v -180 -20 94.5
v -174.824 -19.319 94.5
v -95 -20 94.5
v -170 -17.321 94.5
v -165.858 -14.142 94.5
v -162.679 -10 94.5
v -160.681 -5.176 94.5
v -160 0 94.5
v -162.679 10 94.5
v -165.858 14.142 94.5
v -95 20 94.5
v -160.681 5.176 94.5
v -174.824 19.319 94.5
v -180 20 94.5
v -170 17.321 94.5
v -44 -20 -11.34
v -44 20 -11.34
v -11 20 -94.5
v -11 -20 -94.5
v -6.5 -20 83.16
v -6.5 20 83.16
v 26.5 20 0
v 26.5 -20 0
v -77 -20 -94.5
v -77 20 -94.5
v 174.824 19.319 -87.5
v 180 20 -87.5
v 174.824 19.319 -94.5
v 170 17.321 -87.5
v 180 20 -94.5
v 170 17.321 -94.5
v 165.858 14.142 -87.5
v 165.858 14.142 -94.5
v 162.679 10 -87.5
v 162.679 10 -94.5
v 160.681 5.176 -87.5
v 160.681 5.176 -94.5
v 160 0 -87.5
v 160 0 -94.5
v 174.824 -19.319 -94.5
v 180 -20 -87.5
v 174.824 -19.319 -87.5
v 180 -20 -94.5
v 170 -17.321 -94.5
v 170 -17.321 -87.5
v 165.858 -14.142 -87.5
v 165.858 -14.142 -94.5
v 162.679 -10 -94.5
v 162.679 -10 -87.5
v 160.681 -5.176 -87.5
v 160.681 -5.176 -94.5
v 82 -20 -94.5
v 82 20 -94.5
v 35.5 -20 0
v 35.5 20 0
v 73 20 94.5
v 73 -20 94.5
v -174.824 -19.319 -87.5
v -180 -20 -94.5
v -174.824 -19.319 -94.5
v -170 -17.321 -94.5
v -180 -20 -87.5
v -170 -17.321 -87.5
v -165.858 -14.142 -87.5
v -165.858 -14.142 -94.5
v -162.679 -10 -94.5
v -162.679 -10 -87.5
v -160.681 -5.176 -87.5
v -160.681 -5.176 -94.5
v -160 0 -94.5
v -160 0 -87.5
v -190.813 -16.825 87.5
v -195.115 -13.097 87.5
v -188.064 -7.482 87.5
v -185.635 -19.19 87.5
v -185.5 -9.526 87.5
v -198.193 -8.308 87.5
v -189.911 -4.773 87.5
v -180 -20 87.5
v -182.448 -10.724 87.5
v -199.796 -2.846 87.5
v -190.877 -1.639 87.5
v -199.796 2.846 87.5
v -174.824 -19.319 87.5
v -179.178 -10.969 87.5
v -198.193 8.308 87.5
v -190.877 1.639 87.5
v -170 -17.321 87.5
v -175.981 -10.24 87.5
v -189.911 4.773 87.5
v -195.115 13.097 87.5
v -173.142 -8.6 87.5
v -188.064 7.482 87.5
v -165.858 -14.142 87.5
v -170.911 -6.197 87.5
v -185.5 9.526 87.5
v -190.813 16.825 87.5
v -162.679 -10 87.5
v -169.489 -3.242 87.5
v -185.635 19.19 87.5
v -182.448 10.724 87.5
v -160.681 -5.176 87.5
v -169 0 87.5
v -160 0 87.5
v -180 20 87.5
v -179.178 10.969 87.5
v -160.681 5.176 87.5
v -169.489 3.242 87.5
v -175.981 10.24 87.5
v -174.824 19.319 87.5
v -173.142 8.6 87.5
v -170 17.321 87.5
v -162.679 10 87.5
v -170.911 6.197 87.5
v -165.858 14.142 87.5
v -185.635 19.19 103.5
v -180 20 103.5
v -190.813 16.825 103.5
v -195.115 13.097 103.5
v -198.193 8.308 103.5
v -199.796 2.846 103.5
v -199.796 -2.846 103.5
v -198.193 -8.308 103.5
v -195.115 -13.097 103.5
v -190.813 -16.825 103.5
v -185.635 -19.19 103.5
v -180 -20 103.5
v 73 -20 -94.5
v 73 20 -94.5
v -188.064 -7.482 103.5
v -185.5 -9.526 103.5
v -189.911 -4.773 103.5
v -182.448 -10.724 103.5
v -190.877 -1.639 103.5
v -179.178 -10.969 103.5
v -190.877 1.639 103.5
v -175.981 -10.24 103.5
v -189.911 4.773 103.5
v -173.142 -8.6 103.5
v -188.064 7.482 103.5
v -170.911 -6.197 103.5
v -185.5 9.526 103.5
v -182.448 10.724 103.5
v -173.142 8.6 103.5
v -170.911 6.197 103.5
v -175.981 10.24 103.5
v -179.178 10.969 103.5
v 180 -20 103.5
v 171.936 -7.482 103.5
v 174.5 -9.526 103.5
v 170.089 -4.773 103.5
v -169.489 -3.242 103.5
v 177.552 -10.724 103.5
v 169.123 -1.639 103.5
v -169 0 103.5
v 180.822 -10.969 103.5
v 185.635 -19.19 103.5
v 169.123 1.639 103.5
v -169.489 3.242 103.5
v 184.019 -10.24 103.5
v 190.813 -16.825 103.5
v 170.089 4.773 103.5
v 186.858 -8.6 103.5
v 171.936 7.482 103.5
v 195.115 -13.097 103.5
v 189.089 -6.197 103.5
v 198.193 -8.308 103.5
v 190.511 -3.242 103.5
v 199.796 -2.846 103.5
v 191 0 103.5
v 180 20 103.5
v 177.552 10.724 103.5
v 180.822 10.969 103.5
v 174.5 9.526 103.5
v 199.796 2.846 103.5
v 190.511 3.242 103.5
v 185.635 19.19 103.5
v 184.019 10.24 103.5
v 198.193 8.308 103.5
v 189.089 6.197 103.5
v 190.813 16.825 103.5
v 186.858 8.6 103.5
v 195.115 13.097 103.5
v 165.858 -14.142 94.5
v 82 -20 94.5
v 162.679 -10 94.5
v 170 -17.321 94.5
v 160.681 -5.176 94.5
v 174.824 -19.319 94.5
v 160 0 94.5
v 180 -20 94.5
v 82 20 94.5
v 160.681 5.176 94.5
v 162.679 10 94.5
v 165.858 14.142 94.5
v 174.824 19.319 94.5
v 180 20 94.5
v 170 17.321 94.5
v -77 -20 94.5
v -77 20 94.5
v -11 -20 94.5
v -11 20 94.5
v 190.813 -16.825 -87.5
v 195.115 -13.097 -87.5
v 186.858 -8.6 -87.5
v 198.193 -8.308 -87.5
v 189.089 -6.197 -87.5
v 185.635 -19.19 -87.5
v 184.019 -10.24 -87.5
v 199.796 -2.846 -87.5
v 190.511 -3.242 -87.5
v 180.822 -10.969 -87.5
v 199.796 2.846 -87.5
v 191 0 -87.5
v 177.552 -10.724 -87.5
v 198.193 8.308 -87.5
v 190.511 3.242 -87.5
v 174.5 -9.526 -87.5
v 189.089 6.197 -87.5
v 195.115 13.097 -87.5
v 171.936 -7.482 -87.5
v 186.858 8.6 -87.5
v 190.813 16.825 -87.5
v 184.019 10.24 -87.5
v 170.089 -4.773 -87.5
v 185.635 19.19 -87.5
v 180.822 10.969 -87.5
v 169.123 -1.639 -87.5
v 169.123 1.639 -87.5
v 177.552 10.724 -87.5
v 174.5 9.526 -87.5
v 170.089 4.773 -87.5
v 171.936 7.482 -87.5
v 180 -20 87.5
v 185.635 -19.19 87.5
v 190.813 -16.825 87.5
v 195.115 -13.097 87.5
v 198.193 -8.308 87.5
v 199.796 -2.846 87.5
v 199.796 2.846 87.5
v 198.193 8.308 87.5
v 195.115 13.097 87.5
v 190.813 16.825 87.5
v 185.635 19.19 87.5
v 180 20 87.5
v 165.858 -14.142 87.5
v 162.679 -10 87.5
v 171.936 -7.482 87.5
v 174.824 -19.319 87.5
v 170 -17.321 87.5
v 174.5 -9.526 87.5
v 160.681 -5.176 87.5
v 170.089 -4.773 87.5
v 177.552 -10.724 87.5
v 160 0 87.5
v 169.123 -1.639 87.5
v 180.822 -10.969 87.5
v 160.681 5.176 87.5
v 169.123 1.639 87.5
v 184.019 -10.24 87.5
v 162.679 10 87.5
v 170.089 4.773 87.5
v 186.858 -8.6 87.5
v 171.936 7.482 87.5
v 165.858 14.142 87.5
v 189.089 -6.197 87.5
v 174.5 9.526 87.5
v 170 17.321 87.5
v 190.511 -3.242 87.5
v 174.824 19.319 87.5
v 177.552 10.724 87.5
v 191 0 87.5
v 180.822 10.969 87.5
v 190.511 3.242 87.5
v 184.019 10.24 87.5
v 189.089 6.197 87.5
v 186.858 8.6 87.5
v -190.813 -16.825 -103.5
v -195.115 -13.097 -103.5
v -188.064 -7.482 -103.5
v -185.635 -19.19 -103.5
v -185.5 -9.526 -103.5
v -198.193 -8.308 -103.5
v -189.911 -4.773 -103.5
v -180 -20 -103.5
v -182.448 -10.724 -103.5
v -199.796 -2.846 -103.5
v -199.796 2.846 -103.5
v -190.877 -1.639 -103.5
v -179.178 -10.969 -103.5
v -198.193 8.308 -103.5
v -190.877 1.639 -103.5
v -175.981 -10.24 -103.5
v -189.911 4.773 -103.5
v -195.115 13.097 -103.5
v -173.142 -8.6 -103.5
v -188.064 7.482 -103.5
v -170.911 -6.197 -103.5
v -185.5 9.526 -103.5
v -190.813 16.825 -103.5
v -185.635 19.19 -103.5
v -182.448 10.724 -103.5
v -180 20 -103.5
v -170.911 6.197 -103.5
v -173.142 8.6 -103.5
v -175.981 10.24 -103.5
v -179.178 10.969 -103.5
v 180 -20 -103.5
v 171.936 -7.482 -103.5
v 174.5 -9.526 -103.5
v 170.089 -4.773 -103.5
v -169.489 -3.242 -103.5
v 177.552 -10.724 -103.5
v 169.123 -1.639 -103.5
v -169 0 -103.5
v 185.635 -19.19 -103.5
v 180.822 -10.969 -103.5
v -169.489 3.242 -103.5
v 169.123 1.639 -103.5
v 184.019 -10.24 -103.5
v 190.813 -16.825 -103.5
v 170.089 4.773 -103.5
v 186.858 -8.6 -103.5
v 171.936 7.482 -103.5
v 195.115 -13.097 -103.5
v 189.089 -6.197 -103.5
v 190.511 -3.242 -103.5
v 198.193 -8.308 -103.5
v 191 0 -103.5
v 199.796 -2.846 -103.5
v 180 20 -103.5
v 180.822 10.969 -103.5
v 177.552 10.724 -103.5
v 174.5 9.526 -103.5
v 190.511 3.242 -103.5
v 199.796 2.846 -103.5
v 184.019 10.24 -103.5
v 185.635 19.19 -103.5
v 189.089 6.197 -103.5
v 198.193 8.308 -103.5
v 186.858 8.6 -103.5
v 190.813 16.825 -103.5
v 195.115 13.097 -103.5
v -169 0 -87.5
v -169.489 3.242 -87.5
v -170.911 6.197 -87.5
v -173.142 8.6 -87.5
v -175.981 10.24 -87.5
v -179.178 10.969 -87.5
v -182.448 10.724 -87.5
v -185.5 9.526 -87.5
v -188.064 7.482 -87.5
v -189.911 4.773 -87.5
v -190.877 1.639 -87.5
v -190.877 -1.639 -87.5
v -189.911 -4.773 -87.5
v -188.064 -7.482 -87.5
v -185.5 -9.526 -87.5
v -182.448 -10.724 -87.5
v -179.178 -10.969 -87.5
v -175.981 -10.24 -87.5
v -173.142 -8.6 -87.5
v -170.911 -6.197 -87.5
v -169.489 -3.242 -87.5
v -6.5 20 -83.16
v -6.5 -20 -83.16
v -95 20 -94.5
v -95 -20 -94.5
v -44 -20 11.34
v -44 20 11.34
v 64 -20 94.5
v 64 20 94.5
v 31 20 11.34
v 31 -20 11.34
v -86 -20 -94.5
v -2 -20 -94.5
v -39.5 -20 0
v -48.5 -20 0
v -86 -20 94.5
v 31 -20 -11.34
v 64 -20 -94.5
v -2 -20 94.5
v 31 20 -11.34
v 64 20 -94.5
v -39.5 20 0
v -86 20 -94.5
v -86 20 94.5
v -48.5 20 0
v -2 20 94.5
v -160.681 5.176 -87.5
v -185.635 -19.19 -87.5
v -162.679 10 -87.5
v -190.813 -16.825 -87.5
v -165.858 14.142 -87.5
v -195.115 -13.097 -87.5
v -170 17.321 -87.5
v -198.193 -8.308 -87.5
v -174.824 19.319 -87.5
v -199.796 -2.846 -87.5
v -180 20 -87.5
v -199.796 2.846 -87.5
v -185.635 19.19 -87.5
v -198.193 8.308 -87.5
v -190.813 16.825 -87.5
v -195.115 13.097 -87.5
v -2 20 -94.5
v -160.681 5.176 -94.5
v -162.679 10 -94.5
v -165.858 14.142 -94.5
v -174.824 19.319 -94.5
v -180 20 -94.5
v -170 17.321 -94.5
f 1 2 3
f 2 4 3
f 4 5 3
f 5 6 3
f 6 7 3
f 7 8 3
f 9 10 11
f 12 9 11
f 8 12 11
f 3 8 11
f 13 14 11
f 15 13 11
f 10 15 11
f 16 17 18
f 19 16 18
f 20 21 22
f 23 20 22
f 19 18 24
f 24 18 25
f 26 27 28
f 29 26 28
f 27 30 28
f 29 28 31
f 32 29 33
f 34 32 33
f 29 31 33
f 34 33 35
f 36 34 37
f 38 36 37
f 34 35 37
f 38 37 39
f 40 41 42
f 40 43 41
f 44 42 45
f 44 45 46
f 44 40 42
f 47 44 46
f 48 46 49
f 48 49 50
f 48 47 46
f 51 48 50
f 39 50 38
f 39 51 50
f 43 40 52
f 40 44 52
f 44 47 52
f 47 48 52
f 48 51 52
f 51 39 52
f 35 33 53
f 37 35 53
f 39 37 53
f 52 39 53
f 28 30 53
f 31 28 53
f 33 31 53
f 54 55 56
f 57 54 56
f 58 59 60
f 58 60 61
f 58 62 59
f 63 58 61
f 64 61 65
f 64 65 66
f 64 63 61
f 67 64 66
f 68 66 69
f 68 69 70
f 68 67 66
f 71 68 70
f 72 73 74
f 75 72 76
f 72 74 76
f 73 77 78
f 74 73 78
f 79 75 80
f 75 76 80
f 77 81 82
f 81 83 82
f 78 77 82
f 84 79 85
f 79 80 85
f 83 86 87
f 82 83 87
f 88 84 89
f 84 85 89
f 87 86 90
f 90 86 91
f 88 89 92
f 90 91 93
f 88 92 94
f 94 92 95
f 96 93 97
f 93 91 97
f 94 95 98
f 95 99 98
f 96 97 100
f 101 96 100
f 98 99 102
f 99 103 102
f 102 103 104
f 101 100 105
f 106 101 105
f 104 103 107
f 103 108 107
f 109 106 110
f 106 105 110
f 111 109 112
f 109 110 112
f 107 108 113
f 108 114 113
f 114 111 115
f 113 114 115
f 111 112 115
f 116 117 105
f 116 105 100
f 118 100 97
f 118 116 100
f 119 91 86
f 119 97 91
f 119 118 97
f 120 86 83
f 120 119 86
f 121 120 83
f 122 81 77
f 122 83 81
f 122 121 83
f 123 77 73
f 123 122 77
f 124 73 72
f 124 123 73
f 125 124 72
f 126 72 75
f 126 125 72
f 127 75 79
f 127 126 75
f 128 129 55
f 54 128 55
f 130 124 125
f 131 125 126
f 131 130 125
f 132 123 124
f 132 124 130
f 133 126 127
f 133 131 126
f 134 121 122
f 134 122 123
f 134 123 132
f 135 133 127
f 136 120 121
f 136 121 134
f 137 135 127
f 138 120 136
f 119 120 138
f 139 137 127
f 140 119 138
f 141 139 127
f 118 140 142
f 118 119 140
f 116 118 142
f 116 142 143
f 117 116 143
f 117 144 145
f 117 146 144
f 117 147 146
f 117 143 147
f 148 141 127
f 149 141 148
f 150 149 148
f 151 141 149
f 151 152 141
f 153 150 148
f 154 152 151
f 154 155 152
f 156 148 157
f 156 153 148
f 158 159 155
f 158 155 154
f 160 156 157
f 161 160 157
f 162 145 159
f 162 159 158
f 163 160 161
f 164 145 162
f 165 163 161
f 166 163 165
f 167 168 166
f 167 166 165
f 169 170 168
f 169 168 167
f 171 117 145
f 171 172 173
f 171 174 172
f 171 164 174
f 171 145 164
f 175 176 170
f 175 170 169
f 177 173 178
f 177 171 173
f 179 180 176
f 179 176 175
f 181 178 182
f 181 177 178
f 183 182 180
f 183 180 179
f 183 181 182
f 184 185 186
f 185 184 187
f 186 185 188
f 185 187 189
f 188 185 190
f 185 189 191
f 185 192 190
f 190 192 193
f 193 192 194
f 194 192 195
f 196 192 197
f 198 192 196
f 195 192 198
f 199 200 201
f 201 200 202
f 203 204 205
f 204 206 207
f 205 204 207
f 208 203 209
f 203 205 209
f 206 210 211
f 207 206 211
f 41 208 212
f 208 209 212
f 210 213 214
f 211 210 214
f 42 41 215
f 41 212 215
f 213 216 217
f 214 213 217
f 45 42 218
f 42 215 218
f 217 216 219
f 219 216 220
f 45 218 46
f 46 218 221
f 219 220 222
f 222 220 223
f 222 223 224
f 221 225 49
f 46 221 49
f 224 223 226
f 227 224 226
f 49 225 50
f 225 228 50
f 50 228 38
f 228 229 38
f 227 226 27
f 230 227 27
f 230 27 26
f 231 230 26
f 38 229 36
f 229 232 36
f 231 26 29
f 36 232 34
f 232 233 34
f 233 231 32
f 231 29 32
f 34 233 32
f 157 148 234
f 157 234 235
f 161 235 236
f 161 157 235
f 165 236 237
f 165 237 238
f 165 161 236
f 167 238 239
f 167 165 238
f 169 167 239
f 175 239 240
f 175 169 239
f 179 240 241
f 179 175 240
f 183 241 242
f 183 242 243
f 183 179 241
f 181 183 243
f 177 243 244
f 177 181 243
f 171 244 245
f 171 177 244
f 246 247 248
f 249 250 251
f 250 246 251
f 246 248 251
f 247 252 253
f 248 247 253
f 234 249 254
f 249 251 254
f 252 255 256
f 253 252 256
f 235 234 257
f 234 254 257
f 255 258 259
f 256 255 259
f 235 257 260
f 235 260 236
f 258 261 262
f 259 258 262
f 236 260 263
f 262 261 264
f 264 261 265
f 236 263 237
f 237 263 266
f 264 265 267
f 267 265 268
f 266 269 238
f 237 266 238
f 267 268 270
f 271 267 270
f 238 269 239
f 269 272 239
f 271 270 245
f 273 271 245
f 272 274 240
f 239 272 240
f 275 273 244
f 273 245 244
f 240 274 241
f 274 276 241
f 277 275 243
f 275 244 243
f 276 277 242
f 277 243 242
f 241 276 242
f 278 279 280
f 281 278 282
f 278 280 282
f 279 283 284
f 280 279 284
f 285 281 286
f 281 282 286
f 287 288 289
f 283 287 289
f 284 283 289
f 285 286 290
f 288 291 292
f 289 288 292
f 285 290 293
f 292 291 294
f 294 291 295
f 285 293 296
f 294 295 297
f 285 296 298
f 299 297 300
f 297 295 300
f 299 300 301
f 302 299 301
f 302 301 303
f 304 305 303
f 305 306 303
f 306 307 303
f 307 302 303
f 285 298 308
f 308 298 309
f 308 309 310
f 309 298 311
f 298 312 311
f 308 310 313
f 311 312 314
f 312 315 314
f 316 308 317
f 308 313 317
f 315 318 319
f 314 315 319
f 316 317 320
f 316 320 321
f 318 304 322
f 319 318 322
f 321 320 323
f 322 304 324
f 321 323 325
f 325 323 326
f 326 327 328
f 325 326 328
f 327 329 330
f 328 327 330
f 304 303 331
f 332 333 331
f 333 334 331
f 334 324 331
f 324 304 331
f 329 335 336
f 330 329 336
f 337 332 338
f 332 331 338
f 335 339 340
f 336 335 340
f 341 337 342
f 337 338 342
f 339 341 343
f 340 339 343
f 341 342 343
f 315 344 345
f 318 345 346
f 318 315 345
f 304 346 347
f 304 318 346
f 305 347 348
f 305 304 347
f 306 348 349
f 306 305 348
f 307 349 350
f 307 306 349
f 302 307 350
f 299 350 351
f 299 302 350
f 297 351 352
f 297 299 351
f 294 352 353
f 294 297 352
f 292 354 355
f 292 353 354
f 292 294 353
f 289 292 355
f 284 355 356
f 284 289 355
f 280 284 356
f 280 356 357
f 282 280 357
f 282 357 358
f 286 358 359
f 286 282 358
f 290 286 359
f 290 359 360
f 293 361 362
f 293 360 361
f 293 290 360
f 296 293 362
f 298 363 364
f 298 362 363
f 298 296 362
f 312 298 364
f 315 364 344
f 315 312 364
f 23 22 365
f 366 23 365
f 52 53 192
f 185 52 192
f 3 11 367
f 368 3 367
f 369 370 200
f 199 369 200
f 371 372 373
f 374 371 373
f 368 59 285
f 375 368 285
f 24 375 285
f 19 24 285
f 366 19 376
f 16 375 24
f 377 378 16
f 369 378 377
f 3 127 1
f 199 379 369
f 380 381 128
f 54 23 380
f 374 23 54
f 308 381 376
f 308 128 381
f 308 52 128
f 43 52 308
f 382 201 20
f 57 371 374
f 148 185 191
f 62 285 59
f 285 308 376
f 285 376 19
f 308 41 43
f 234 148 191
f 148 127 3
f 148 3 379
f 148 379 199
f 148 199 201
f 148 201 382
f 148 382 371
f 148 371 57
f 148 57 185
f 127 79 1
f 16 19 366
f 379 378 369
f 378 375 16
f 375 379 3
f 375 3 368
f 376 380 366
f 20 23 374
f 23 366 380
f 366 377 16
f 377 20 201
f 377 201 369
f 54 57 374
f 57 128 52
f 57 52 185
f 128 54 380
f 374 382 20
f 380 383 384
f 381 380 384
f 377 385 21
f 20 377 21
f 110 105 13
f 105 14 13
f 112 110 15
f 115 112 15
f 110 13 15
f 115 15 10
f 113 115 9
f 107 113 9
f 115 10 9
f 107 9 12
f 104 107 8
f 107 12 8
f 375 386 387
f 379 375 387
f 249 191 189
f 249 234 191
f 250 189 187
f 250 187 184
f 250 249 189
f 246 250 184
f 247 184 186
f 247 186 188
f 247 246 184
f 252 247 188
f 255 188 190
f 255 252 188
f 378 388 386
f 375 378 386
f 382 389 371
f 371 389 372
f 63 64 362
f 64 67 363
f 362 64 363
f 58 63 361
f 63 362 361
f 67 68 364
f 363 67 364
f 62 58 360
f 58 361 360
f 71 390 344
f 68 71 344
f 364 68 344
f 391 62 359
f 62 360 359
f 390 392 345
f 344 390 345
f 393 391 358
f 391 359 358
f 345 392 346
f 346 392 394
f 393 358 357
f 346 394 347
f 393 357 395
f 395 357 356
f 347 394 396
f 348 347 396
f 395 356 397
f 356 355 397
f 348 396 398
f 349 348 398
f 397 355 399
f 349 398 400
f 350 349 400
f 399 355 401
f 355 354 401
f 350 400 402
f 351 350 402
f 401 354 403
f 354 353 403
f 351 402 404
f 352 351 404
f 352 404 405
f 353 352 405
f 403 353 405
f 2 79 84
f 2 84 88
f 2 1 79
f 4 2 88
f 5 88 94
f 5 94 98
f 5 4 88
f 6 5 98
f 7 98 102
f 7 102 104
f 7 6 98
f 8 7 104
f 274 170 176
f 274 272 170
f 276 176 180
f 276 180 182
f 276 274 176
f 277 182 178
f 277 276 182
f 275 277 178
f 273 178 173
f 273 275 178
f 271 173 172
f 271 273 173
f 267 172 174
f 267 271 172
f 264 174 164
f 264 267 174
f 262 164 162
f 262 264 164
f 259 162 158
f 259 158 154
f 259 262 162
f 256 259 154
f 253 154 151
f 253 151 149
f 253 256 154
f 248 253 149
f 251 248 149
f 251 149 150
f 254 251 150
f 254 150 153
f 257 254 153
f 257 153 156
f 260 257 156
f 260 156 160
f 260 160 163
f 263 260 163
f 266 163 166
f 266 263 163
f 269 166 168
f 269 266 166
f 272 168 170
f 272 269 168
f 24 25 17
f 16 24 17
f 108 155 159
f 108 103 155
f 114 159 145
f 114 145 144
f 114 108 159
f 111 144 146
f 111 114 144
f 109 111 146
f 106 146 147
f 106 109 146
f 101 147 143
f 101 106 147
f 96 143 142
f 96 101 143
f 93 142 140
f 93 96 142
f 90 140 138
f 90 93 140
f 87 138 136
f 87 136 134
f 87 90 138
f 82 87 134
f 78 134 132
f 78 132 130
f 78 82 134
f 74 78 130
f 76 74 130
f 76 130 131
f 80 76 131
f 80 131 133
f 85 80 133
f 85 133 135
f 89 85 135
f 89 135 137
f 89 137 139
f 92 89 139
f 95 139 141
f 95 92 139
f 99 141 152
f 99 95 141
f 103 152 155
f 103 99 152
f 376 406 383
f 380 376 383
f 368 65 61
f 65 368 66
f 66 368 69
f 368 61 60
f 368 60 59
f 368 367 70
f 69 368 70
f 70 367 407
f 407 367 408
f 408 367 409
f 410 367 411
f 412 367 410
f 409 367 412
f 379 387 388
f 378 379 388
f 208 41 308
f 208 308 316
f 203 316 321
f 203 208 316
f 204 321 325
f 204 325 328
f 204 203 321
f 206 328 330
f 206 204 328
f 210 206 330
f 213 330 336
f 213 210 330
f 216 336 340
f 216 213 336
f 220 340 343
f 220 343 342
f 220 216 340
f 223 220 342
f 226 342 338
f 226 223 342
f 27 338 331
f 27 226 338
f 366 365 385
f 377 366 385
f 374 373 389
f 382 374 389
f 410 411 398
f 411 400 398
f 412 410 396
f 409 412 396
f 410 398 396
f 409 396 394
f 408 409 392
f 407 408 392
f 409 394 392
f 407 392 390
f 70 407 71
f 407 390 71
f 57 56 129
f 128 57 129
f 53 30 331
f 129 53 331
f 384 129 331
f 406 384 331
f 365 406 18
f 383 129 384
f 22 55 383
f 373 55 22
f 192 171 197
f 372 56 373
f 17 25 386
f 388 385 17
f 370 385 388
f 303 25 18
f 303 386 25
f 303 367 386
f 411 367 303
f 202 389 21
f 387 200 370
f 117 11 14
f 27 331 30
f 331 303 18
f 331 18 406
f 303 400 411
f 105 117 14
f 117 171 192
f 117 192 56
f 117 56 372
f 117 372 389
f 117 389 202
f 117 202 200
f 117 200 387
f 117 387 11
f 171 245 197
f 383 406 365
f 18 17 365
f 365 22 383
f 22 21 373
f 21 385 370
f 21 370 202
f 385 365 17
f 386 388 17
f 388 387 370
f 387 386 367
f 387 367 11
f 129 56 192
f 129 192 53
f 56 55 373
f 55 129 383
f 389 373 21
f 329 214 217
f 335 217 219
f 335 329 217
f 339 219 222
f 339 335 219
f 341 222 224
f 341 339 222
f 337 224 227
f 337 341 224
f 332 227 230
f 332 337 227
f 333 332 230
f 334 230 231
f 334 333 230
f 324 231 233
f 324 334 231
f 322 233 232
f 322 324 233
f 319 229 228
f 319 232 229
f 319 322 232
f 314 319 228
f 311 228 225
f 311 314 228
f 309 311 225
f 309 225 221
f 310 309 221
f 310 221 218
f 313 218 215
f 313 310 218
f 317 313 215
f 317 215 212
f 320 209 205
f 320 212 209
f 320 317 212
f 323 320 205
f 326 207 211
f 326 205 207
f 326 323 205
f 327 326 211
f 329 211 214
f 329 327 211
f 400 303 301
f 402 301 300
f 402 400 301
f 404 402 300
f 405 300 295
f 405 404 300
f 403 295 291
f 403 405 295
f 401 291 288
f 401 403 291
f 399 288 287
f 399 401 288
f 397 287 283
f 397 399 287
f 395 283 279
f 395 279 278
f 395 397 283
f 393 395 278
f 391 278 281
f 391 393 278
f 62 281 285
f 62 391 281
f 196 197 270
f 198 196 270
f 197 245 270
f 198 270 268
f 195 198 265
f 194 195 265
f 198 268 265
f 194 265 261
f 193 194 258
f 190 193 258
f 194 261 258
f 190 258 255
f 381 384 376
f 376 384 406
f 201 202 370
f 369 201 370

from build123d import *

# Parameters (mm, degrees)
SKETCH1_R           = 11
BOSS_EXTRUDE1_DEPTH = 103.5
CUT_EXTRUDE1_REACH  = 230.719
SKETCH5_W           = 20
SKETCH5_H           = 175
FILLET1_R           = 20


with BuildPart() as part:
    # Sketch1 → Boss-Extrude1 (new, symmetric)
    with BuildSketch(Plane.XY):
        with BuildLine():
            Line((-180, -20), (180, -20))
            ThreePointArc((180, -20), (200, 0), (180, 20))
            Line((180, 20), (-180, 20))
            ThreePointArc((-180, 20), (-200, 0), (-180, -20))
        make_face()
        with Locations((-180, 0)):
            Circle(SKETCH1_R, mode=Mode.SUBTRACT)
        with Locations((180, 0)):
            Circle(SKETCH1_R, mode=Mode.SUBTRACT)
    extrude(amount=BOSS_EXTRUDE1_DEPTH, both=True)

    # Cut-Extrude1: up to this face of the body (flat: up to its plane)
    cut_extrude1_end = Plane(part.part.faces().sort_by_distance((0, -20, 0))[0])
    # Sketch5 → Cut-Extrude1 (cut, up to the picked face)
    with BuildSketch(Plane(origin=(0, 20, 0), x_dir=(1, 0, 0), z_dir=(0, 1, 0)), mode=Mode.PRIVATE) as cut_extrude1_sk1:
        Polygon((-95, -94.5), (-95, 94.5), (-160, 94.5), (-160, 87.5), (-180, 87.5), (-180, -87.5), (-160, -87.5), (-160, -94.5), align=None)
    cut_extrude1_tool1 = split(extrude(cut_extrude1_sk1.sketch, amount=-CUT_EXTRUDE1_REACH, mode=Mode.PRIVATE), bisect_by=cut_extrude1_end, keep=Keep.BOTH, mode=Mode.PRIVATE)
    # Sketch5 → Cut-Extrude1 (cut, up to the picked face)
    with BuildSketch(Plane(origin=(0, 20, 0), x_dir=(1, 0, 0), z_dir=(0, 1, 0)), mode=Mode.PRIVATE) as cut_extrude1_sk2:
        with Locations((-190, 0)):
            Rectangle(SKETCH5_W, SKETCH5_H)
    cut_extrude1_tool2 = split(extrude(cut_extrude1_sk2.sketch, amount=-CUT_EXTRUDE1_REACH, mode=Mode.PRIVATE), bisect_by=cut_extrude1_end, keep=Keep.BOTH, mode=Mode.PRIVATE)
    # Sketch5 → Cut-Extrude1 (cut, up to the picked face)
    with BuildSketch(Plane(origin=(0, 20, 0), x_dir=(1, 0, 0), z_dir=(0, 1, 0)), mode=Mode.PRIVATE) as cut_extrude1_sk3:
        Polygon((-48.5, 0), (-86, 94.5), (-86, -94.5), align=None)
    cut_extrude1_tool3 = split(extrude(cut_extrude1_sk3.sketch, amount=-CUT_EXTRUDE1_REACH, mode=Mode.PRIVATE), bisect_by=cut_extrude1_end, keep=Keep.BOTH, mode=Mode.PRIVATE)
    # Sketch5 → Cut-Extrude1 (cut, up to the picked face)
    with BuildSketch(Plane(origin=(0, 20, 0), x_dir=(1, 0, 0), z_dir=(0, 1, 0)), mode=Mode.PRIVATE) as cut_extrude1_sk4:
        Polygon((-11, 94.5), (-77, 94.5), (-44, 11.34), align=None)
    cut_extrude1_tool4 = split(extrude(cut_extrude1_sk4.sketch, amount=-CUT_EXTRUDE1_REACH, mode=Mode.PRIVATE), bisect_by=cut_extrude1_end, keep=Keep.BOTH, mode=Mode.PRIVATE)
    # Sketch5 → Cut-Extrude1 (cut, up to the picked face)
    with BuildSketch(Plane(origin=(0, 20, 0), x_dir=(1, 0, 0), z_dir=(0, 1, 0)), mode=Mode.PRIVATE) as cut_extrude1_sk5:
        Polygon((26.5, 0), (-6.5, 83.16), (-39.5, 0), (-6.5, -83.16), align=None)
    cut_extrude1_tool5 = split(extrude(cut_extrude1_sk5.sketch, amount=-CUT_EXTRUDE1_REACH, mode=Mode.PRIVATE), bisect_by=cut_extrude1_end, keep=Keep.BOTH, mode=Mode.PRIVATE)
    # Sketch5 → Cut-Extrude1 (cut, up to the picked face)
    with BuildSketch(Plane(origin=(0, 20, 0), x_dir=(1, 0, 0), z_dir=(0, 1, 0)), mode=Mode.PRIVATE) as cut_extrude1_sk6:
        Polygon((-44, -11.34), (-77, -94.5), (-11, -94.5), align=None)
    cut_extrude1_tool6 = split(extrude(cut_extrude1_sk6.sketch, amount=-CUT_EXTRUDE1_REACH, mode=Mode.PRIVATE), bisect_by=cut_extrude1_end, keep=Keep.BOTH, mode=Mode.PRIVATE)
    # Sketch5 → Cut-Extrude1 (cut, up to the picked face)
    with BuildSketch(Plane(origin=(0, 20, 0), x_dir=(1, 0, 0), z_dir=(0, 1, 0)), mode=Mode.PRIVATE) as cut_extrude1_sk7:
        Polygon((64, 94.5), (-2, 94.5), (31, 11.34), align=None)
    cut_extrude1_tool7 = split(extrude(cut_extrude1_sk7.sketch, amount=-CUT_EXTRUDE1_REACH, mode=Mode.PRIVATE), bisect_by=cut_extrude1_end, keep=Keep.BOTH, mode=Mode.PRIVATE)
    # Sketch5 → Cut-Extrude1 (cut, up to the picked face)
    with BuildSketch(Plane(origin=(0, 20, 0), x_dir=(1, 0, 0), z_dir=(0, 1, 0)), mode=Mode.PRIVATE) as cut_extrude1_sk8:
        Polygon((73, -94.5), (73, 94.5), (35.5, 0), align=None)
    cut_extrude1_tool8 = split(extrude(cut_extrude1_sk8.sketch, amount=-CUT_EXTRUDE1_REACH, mode=Mode.PRIVATE), bisect_by=cut_extrude1_end, keep=Keep.BOTH, mode=Mode.PRIVATE)
    # Sketch5 → Cut-Extrude1 (cut, up to the picked face)
    with BuildSketch(Plane(origin=(0, 20, 0), x_dir=(1, 0, 0), z_dir=(0, 1, 0)), mode=Mode.PRIVATE) as cut_extrude1_sk9:
        Polygon((31, -11.34), (-2, -94.5), (64, -94.5), align=None)
    cut_extrude1_tool9 = split(extrude(cut_extrude1_sk9.sketch, amount=-CUT_EXTRUDE1_REACH, mode=Mode.PRIVATE), bisect_by=cut_extrude1_end, keep=Keep.BOTH, mode=Mode.PRIVATE)
    # Sketch5 → Cut-Extrude1 (cut, up to the picked face)
    with BuildSketch(Plane(origin=(0, 20, 0), x_dir=(1, 0, 0), z_dir=(0, 1, 0)), mode=Mode.PRIVATE) as cut_extrude1_sk10:
        Polygon((160, 87.5), (160, 94.5), (82, 94.5), (82, -94.5), (160, -94.5), (160, -87.5), (180, -87.5), (180, 87.5), align=None)
    cut_extrude1_tool10 = split(extrude(cut_extrude1_sk10.sketch, amount=-CUT_EXTRUDE1_REACH, mode=Mode.PRIVATE), bisect_by=cut_extrude1_end, keep=Keep.BOTH, mode=Mode.PRIVATE)
    # Sketch5 → Cut-Extrude1 (cut, up to the picked face)
    with BuildSketch(Plane(origin=(0, 20, 0), x_dir=(1, 0, 0), z_dir=(0, 1, 0)), mode=Mode.PRIVATE) as cut_extrude1_sk11:
        with Locations((190, 0)):
            Rectangle(SKETCH5_W, SKETCH5_H)
    cut_extrude1_tool11 = split(extrude(cut_extrude1_sk11.sketch, amount=-CUT_EXTRUDE1_REACH, mode=Mode.PRIVATE), bisect_by=cut_extrude1_end, keep=Keep.BOTH, mode=Mode.PRIVATE)
    add(cut_extrude1_tool1.solids().sort_by(Axis((-136.923503, 20, 0), (0, -1, 0)))[0], mode=Mode.SUBTRACT)
    add(cut_extrude1_tool2.solids().sort_by(Axis((-190, 20, 0), (0, -1, 0)))[0], mode=Mode.SUBTRACT)
    add(cut_extrude1_tool3.solids().sort_by(Axis((-73.5, 20, 0), (0, -1, 0)))[0], mode=Mode.SUBTRACT)
    add(cut_extrude1_tool4.solids().sort_by(Axis((-44, 20, -66.78), (0, -1, 0)))[0], mode=Mode.SUBTRACT)
    add(cut_extrude1_tool5.solids().sort_by(Axis((-6.5, 20, 0), (0, -1, 0)))[0], mode=Mode.SUBTRACT)
    add(cut_extrude1_tool6.solids().sort_by(Axis((-44, 20, 66.78), (0, -1, 0)))[0], mode=Mode.SUBTRACT)
    add(cut_extrude1_tool7.solids().sort_by(Axis((31, 20, -66.78), (0, -1, 0)))[0], mode=Mode.SUBTRACT)
    add(cut_extrude1_tool8.solids().sort_by(Axis((60.5, 20, 0), (0, -1, 0)))[0], mode=Mode.SUBTRACT)
    add(cut_extrude1_tool9.solids().sort_by(Axis((31, 20, 66.78), (0, -1, 0)))[0], mode=Mode.SUBTRACT)
    add(cut_extrude1_tool10.solids().sort_by(Axis((130.401381, 20, 0), (0, -1, 0)))[0], mode=Mode.SUBTRACT)
    add(cut_extrude1_tool11.solids().sort_by(Axis((190, 20, 0), (0, -1, 0)))[0], mode=Mode.SUBTRACT)

    # Fillet1
    fillet1_edges = [part.edges().sort_by_distance(p)[0] for p in [
        (160, -20, 91),
        (160, 20, 91),
        (160, -20, -91),
        (160, 20, -91),
        (-160, -20, 91),
        (-160, 20, 91),
        (-160, -20, -91),
        (-160, 20, -91),
    ]]
    fillet(fillet1_edges, radius=FILLET1_R - 0.0001)  # a hair under: the kernel refuses the full size


solid = part.part
